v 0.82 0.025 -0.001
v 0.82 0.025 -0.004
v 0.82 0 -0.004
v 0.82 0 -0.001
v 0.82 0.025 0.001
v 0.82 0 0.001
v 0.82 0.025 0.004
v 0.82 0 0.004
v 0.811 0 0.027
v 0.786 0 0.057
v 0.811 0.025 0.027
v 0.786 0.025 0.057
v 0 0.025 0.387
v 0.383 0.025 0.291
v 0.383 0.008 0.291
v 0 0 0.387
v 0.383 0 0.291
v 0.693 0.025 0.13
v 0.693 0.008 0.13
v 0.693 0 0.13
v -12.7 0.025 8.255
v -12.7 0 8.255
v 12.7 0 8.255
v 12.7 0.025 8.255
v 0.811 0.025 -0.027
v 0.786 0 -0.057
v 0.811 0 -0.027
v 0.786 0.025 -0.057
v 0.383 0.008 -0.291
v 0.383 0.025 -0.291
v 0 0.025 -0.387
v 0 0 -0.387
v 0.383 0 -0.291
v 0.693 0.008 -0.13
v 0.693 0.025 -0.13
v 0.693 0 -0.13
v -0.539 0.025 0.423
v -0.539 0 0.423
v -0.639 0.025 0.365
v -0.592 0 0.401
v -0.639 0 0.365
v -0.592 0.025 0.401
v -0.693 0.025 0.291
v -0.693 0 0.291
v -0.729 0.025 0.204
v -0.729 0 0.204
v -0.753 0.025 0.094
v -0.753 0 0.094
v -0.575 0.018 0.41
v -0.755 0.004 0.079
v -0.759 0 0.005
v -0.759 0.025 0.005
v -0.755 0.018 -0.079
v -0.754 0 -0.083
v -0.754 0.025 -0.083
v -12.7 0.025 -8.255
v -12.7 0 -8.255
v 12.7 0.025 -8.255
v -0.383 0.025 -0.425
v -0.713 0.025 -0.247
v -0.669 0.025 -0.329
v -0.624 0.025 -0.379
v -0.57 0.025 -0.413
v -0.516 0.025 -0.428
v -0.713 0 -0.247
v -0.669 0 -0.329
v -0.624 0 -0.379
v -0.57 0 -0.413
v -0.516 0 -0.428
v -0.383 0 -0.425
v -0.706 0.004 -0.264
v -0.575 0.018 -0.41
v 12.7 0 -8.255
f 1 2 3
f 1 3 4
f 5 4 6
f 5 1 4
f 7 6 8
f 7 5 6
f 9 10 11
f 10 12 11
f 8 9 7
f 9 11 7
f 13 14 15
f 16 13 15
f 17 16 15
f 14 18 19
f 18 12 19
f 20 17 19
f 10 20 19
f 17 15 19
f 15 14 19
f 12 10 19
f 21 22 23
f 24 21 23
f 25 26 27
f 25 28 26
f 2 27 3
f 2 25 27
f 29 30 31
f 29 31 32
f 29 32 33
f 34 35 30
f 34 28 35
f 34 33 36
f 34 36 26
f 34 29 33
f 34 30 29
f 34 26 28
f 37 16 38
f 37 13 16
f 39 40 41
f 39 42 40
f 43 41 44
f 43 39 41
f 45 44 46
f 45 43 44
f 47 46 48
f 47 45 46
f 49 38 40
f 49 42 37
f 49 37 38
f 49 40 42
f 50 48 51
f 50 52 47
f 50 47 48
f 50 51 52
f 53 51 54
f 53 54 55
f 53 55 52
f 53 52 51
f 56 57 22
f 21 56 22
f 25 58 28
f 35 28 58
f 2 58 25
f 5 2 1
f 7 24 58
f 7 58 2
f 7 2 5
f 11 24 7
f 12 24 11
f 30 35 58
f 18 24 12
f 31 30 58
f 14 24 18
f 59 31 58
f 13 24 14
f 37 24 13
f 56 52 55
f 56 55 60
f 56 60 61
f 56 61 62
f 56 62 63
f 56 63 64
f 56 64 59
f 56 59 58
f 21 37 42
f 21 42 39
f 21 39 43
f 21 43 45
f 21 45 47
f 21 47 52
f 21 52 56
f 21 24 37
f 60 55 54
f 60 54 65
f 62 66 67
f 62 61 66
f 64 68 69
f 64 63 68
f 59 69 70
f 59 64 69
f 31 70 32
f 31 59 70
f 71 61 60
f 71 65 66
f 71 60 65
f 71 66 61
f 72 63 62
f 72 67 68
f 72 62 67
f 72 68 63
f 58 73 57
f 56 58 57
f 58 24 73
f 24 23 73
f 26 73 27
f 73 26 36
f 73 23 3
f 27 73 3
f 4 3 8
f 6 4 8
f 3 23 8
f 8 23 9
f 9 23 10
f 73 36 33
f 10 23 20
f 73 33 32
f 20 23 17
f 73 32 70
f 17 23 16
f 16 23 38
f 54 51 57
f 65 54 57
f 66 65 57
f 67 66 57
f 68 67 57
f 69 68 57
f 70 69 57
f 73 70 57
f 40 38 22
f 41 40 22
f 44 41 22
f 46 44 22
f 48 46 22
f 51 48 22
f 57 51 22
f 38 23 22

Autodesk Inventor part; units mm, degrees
ref_plane "YZ Plane" through (0, 0, 0) normal (1, 0, 0) x (0, 1, 0)
ref_plane "XZ Plane" through (0, 0, 0) normal (0, 1, 0) x (-1, 0, 0)
ref_plane "XY Plane" through (0, 0, 0) normal (0, 0, 1) x (1, 0, 0)
sketch "stock_cut_for_holder" plane through (0, 0, 0) normal (0, 1, 0) x (-1, 0, 0)
  line L0 (-12.7, -8.255) -> (12.7, -8.255)
  line L1 (12.7, -8.255) -> (12.7, 8.255)
  line L2 (12.7, 8.255) -> (-12.7, 8.255)
  line L3 (-12.7, 8.255) -> (-12.7, -8.255)
  line L4 (-12.7, -8.255) -> (12.7, 8.255) construction
  line L5 (12.7, -8.255) -> (-12.7, 8.255) construction
  point P0 (0, 0)
  dimension "cut_shim_height" = 25.4
  dimension "cut_shim_width" = 16.51
extrude "Plate1" add sketch "stock_cut_for_holder" along normal blind 0.0254
sketch "mill_path" plane through (0, 0.0254, 0) normal (0, 1, 0) x (1, 0, 0)
  line L0 (12.7, 8.255) -> (12.7, -8.255) projected
  line L1 (-12.7, 8.255) -> (12.7, 8.255) projected
  line L2 (-12.7, -8.255) -> (-12.7, 8.255) projected
  line L3 (12.7, -8.255) -> (-12.7, -8.255) projected
  line L4 (-12.7, 8.255) -> (-12.7, -8.255) projected
  line L5 (-12.7, 0) -> (12.7, 0) construction
  line L6 (12.7, -8.255) -> (12.7, 8.255) projected
  line L7 (0, 0) -> (0, -0.3873) construction
  line L8 (0, 0) -> (0, 0.3873) construction
  line L9 (-0.4318, 0) -> (-0.4318, -0.4318) construction
  line L10 (-0.4318, 0) -> (-0.4318, 0.4318) construction
  line L11 (0.5715, 0) -> (0.5715, -0.2032) construction
  line L12 (-0.6731, 0) -> (-0.6731, -0.381) construction
  line L13 (0.5715, 0) -> (0.5715, 0.2032) construction
  line L14 (-0.6731, 0) -> (-0.6731, 0.381) construction
  line L15 (-0.5334, 0) -> (-0.5334, -0.4445) construction
  line L16 (-0.5334, 0) -> (-0.5334, 0.4445) construction
  line L17 (0.5715, 0) -> (0.5715, 0.2032) construction
  line L18 (-0.7544, 0) -> (-0.7544, -0.1524) construction
  line L19 (-0.7544, 0) -> (-0.7544, 0.1524)
  line L20 (0.8001, 0) -> (0.8001, -0.0419) construction
  line L21 (0.8001, 0) -> (0.8001, 0.0419) construction
  spline S0 degree 3 poles (0, -0.3874) (0.3885, -0.3543) (0.8365, -0.0723) (0.8192, 0) knots 0 0 0 0 1 1 1 1
  spline S1 degree 3 poles (0, 0.3873) (0.3885, 0.3543) (0.8365, 0.0723) (0.8191, 0) knots 0 0 0 0 1 1 1 1
  line L22 (0, -0.3873) -> (-0.4318, -0.4318) construction
  line L23 (-0.4318, -0.4318) -> (-0.5334, -0.4445) construction
  line L24 (-0.5334, -0.4445) -> (-0.6731, -0.381) construction
  line L25 (-0.6731, -0.381) -> (-0.7544, -0.1524) construction
  line L26 (-0.7544, -0.1524) -> (-0.7626, 0) construction
  line L27 (-0.7626, 0) -> (-0.7544, 0.1524) construction
  line L28 (-0.7544, 0.1524) -> (-0.6731, 0.381) construction
  line L29 (-0.6731, 0.381) -> (-0.5334, 0.4445) construction
  line L30 (-0.5334, 0.4445) -> (-0.4318, 0.4318) construction
  line L31 (-0.4318, 0.4318) -> (0, 0.3873) construction
  spline S2 degree 4 poles (0, -0.3873) (-0.4318, -0.4318) (-0.5334, -0.4445) (-0.6731, -0.381) (-0.7544, -0.1524) (-0.7626, 0) (-0.7544, 0.1524) (-0.6731, 0.381) (-0.5334, 0.4445) (-0.4318, 0.4318) (0, 0.3873) knots 1 1 1 1 1 2 3 4 5 6 7 8 8 8 8 8
  dimension "half_mid_thorax_width" = 0.3874
  dimension "mid_thorax_to_prescutum" = 0.4318
  dimension "w2" = 0.4318
  dimension "d9" = 0.2032
  dimension "mid_thorax_to_anterior_scutellum" = 0.5715
  dimension "d11" = 0.381
  dimension "d13" = 0.4445
  dimension "head_thorax" = 0.1016
  dimension "d15" = 0.1397
  dimension "d17" = 0.1524
  dimension "d18" = 0.0813
  dimension "scutellum_taper" = 0.2286
  dimension "d20" = 0.0419
  dimension "d21" = 0.0191
  dimension "d22" = 0.0083
  dimension "d24" = 0.3226
  dimension "d25" = 1.5818
extrude "milled_hole" cut sketch "mill_path" against normal blind 0.0254 contours S2 S1 S0
fillet "Corner Round1" radius 0.127 1 edges at (0.8192, 0.0127, 0)
equation "\"d26\" = Thickness"
equation "\"BendRadius\" = Thickness"
equation "\"BendReliefWidth\" = Thickness"
equation "\"BendReliefDepth\" = 0.5 * Thickness"
equation "\"CornerReliefSize\" = 4 * Thickness"
equation "\"MinimumRemnant\" = 2 * Thickness"
equation "\"TransitionRadius\" = BendRadius"
equation "\"JacobiRadiusSize\" = BendRadius"
equation "\"GapSize\" = Thickness"
equation "\"d2\" = BendRadius"
equation "\"Thickness\" = 0.0254"
properties part number "standard_antennal_lobe_kumato_v02" material "Stainless Steel AISI 317"
